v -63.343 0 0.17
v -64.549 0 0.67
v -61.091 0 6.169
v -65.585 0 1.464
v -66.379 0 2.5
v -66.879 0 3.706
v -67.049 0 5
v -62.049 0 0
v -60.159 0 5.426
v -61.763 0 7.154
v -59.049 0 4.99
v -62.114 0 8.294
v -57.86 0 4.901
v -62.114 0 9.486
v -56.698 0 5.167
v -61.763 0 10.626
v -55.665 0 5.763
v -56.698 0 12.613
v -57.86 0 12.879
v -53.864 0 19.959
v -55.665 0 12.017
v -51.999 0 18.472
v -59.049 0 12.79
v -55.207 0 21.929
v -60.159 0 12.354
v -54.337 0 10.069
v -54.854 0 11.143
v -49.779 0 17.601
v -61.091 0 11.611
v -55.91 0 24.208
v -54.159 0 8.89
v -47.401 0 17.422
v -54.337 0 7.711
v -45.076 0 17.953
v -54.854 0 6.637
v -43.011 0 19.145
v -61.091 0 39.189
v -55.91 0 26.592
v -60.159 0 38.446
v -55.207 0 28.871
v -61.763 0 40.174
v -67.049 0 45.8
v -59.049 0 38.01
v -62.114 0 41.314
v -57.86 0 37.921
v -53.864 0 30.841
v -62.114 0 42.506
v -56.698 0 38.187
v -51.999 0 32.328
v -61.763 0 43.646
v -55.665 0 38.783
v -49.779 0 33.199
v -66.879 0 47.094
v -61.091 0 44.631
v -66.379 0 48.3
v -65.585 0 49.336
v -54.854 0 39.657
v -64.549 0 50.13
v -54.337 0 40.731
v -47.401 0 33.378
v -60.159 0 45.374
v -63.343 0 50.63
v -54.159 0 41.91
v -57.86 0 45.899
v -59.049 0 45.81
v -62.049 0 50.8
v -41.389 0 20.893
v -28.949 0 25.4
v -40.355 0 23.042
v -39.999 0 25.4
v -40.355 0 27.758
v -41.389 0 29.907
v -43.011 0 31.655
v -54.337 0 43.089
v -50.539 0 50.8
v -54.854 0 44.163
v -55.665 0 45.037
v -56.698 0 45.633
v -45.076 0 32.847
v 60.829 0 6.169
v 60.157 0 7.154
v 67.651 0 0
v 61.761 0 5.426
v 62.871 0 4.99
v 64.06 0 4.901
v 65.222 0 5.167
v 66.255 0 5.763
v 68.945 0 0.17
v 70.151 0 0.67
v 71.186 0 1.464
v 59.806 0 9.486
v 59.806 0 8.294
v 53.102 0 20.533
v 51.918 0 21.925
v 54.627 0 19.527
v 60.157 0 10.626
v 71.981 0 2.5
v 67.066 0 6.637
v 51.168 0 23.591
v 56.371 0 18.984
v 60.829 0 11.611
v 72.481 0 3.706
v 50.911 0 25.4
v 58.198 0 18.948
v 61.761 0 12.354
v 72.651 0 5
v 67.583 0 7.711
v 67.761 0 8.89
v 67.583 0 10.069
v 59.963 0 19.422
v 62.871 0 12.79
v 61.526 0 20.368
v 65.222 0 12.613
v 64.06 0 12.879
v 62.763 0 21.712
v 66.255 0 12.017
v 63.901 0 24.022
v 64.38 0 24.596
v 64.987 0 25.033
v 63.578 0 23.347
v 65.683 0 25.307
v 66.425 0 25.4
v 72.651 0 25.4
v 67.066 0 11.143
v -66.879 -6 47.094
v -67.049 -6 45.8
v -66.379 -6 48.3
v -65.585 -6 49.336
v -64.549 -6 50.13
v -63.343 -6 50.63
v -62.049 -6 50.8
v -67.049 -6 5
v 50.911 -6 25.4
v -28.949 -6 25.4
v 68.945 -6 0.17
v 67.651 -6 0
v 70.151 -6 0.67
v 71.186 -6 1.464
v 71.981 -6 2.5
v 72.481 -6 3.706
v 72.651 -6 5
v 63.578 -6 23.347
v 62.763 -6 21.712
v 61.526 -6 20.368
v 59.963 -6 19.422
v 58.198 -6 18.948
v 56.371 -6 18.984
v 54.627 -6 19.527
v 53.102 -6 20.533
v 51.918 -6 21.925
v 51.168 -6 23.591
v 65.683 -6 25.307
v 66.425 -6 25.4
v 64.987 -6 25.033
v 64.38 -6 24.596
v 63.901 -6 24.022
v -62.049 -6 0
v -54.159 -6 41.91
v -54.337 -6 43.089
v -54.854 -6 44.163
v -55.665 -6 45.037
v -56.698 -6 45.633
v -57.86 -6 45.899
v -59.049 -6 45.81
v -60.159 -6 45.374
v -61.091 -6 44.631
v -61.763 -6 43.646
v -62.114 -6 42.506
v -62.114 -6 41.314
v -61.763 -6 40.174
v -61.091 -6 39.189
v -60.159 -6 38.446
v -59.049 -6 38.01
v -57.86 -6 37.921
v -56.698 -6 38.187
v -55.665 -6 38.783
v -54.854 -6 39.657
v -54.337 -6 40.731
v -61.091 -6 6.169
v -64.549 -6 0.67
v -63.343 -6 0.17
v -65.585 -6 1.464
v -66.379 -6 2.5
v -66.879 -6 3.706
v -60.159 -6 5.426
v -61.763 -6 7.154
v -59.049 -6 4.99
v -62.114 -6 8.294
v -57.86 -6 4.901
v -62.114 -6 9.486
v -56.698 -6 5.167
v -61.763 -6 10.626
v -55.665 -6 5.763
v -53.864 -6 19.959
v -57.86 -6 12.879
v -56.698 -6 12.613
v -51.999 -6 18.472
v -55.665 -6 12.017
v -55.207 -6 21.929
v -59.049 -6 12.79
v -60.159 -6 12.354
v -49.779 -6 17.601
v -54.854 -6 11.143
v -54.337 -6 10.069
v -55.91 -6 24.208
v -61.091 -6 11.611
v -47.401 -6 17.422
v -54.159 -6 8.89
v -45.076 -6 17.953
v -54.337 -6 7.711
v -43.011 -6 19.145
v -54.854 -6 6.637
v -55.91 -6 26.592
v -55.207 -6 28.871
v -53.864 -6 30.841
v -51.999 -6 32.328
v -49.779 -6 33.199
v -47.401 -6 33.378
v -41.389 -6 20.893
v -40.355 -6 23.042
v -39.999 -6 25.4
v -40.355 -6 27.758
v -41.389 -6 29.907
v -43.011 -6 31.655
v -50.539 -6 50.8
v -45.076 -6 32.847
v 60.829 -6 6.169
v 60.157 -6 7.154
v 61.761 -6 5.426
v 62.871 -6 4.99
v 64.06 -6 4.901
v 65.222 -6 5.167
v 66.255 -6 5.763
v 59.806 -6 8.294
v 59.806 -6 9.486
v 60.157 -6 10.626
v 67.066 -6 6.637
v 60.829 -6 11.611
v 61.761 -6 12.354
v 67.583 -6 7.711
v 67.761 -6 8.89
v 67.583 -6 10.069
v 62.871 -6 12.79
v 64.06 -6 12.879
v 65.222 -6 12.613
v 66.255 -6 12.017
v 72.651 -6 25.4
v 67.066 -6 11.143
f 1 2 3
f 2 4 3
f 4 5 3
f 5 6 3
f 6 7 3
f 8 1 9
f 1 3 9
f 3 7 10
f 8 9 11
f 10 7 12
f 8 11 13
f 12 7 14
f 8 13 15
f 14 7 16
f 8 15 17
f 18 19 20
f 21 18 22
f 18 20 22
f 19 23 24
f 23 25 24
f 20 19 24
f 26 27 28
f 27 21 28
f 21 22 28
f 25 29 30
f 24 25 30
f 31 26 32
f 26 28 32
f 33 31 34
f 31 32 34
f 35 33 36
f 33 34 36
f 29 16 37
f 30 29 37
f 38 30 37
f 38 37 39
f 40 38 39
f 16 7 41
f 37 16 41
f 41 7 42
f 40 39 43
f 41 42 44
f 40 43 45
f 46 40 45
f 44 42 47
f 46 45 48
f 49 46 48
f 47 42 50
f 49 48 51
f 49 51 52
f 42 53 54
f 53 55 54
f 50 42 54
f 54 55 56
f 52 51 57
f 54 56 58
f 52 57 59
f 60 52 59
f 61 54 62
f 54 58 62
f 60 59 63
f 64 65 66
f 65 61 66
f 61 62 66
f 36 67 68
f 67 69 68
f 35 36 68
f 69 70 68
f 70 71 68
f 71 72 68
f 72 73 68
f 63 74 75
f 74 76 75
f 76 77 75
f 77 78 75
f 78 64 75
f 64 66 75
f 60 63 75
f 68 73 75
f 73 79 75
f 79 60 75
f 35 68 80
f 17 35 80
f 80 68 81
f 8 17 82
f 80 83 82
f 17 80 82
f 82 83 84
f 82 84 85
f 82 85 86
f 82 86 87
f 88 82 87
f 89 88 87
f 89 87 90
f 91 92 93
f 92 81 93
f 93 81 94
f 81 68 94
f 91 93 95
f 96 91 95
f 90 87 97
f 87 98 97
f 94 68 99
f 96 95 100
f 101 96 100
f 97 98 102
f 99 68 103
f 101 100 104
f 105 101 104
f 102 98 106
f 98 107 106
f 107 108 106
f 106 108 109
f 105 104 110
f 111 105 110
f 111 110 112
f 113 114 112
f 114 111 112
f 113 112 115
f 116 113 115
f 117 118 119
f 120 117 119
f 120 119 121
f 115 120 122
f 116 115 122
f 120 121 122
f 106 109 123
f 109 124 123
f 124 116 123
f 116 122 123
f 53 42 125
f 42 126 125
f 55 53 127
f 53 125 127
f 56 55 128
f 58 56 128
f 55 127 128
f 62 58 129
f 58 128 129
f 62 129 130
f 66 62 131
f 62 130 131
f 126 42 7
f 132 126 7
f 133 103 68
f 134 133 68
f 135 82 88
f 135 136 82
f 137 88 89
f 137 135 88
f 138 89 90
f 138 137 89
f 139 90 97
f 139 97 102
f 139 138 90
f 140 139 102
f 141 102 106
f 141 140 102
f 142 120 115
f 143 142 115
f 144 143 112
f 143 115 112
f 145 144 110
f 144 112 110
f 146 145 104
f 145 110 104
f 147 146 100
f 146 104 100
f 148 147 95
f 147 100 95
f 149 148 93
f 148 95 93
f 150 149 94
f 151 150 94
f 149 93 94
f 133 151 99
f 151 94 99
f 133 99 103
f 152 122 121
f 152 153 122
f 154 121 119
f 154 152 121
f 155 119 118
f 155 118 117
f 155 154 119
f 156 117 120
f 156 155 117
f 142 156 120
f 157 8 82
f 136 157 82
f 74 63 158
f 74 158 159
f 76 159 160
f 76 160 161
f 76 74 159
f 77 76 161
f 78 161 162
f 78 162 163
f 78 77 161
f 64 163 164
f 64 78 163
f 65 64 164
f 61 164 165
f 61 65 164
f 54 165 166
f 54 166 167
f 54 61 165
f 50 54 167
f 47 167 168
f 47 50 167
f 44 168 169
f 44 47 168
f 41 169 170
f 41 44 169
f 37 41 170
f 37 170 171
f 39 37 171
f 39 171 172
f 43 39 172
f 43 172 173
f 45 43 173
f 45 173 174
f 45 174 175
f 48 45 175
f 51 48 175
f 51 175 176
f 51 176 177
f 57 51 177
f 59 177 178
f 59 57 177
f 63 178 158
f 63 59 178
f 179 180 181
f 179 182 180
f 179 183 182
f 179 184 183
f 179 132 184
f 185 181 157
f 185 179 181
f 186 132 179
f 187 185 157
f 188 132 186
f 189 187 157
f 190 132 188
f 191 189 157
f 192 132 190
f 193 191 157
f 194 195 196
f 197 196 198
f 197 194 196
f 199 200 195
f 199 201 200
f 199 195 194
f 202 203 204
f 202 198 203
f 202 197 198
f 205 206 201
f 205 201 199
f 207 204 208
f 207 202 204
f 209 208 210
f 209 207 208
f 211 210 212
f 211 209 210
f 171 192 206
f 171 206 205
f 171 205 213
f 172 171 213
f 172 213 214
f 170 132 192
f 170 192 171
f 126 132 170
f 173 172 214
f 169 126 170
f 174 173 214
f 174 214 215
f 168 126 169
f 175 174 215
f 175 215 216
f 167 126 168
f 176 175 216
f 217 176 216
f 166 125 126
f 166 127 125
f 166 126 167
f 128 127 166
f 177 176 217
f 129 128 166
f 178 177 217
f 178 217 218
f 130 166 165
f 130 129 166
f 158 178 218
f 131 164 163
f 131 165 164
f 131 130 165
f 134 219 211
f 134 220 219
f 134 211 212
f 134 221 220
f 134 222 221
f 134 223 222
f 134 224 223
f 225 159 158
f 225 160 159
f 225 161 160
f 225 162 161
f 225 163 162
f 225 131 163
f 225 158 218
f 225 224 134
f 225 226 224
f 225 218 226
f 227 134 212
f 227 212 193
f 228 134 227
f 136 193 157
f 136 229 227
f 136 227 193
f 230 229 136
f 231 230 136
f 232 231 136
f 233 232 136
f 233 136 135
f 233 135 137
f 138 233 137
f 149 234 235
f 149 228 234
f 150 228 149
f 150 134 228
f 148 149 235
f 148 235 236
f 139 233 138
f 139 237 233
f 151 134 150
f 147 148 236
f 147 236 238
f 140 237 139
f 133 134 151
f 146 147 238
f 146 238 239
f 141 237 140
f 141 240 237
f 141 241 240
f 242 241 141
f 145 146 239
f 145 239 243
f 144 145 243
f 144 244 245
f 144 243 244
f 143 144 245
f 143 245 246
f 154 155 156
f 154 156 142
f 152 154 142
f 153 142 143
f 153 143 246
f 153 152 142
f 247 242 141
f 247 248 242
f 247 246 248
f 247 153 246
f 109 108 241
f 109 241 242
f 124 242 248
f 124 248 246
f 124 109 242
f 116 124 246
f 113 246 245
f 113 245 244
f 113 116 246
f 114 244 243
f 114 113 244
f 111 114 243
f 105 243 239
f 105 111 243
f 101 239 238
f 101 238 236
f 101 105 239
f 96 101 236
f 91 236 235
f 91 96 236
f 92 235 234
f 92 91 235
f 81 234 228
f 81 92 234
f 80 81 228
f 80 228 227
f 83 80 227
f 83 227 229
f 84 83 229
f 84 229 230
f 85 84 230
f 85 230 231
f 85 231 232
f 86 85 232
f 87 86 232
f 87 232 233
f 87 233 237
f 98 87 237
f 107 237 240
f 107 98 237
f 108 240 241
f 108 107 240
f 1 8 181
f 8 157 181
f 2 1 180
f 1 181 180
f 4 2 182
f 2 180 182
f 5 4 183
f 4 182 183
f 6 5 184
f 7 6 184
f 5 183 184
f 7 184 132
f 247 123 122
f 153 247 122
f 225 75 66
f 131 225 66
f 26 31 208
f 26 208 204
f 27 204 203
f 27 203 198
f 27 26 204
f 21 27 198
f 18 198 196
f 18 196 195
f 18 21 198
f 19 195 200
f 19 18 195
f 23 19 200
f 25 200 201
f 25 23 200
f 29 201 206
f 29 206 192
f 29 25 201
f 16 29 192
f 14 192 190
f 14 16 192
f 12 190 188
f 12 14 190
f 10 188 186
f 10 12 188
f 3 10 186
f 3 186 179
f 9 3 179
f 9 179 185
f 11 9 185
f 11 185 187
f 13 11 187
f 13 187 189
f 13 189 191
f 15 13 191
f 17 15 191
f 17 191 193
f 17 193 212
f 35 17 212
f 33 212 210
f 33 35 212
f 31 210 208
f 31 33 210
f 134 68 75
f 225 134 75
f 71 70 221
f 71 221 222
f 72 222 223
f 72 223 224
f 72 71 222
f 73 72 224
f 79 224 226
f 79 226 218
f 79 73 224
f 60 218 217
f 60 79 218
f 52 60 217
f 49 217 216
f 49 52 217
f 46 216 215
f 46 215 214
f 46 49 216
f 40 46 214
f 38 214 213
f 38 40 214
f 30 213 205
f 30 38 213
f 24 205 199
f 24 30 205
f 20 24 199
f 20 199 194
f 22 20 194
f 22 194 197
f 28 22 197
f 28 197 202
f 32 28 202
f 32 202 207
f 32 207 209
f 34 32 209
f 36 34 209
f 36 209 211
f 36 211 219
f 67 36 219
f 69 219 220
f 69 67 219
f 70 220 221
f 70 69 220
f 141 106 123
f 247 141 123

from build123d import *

# Parameters (mm, degrees)
F0_R     = 4
F0_R_2   = 8
F1_DEPTH = 6
F2_R     = 5
F3_R     = 3


with BuildPart() as f1:
    # F0 (on Front) → F1 (new body)
    with BuildSketch(Plane.XZ):
        with BuildLine():
            Line((-67.049116, 8.89), (-67.049116, 0))
            Line((-67.049116, 0), (72.650884, 0))
            Line((72.650884, 0), (72.650884, 25.4))
            Line((72.650884, 25.4), (63.910884, 25.4))
            ThreePointArc((63.910884, 25.4), (57.410884, 18.9), (50.910884, 25.4))
            Line((50.910884, 25.4), (-28.949116, 25.4))
            Line((-28.949116, 25.4), (-50.539116, 50.8))
            Line((-50.539116, 50.8), (-67.049116, 50.8))
            Line((-67.049116, 50.8), (-67.049116, 41.91))
            Line((-67.049116, 41.91), (-67.049116, 8.89))
        make_face()
        with Locations((-58.159116, 8.89)):
            Circle(F0_R, mode=Mode.SUBTRACT)
        with Locations((-47.999116, 25.4)):
            Circle(F0_R_2, mode=Mode.SUBTRACT)
        with Locations((63.760884, 8.89)):
            Circle(F0_R, mode=Mode.SUBTRACT)
        with Locations((-58.159116, 41.91)):
            Circle(F0_R, mode=Mode.SUBTRACT)
    extrude(amount=F1_DEPTH)

    # F2
    f2_edges = [f1.edges().sort_by_distance(p)[0] for p in [
        (-67.049116, -3, 50.8),
        (-67.049116, -3, 0),
        (72.650884, -3, 0),
    ]]
    fillet(f2_edges, radius=F2_R)

    # F3
    f3_edges = [f1.edges().sort_by_distance(p)[0] for p in [
        (63.910884, -3, 25.4),
    ]]
    fillet(f3_edges, radius=F3_R)


solid = f1.part
